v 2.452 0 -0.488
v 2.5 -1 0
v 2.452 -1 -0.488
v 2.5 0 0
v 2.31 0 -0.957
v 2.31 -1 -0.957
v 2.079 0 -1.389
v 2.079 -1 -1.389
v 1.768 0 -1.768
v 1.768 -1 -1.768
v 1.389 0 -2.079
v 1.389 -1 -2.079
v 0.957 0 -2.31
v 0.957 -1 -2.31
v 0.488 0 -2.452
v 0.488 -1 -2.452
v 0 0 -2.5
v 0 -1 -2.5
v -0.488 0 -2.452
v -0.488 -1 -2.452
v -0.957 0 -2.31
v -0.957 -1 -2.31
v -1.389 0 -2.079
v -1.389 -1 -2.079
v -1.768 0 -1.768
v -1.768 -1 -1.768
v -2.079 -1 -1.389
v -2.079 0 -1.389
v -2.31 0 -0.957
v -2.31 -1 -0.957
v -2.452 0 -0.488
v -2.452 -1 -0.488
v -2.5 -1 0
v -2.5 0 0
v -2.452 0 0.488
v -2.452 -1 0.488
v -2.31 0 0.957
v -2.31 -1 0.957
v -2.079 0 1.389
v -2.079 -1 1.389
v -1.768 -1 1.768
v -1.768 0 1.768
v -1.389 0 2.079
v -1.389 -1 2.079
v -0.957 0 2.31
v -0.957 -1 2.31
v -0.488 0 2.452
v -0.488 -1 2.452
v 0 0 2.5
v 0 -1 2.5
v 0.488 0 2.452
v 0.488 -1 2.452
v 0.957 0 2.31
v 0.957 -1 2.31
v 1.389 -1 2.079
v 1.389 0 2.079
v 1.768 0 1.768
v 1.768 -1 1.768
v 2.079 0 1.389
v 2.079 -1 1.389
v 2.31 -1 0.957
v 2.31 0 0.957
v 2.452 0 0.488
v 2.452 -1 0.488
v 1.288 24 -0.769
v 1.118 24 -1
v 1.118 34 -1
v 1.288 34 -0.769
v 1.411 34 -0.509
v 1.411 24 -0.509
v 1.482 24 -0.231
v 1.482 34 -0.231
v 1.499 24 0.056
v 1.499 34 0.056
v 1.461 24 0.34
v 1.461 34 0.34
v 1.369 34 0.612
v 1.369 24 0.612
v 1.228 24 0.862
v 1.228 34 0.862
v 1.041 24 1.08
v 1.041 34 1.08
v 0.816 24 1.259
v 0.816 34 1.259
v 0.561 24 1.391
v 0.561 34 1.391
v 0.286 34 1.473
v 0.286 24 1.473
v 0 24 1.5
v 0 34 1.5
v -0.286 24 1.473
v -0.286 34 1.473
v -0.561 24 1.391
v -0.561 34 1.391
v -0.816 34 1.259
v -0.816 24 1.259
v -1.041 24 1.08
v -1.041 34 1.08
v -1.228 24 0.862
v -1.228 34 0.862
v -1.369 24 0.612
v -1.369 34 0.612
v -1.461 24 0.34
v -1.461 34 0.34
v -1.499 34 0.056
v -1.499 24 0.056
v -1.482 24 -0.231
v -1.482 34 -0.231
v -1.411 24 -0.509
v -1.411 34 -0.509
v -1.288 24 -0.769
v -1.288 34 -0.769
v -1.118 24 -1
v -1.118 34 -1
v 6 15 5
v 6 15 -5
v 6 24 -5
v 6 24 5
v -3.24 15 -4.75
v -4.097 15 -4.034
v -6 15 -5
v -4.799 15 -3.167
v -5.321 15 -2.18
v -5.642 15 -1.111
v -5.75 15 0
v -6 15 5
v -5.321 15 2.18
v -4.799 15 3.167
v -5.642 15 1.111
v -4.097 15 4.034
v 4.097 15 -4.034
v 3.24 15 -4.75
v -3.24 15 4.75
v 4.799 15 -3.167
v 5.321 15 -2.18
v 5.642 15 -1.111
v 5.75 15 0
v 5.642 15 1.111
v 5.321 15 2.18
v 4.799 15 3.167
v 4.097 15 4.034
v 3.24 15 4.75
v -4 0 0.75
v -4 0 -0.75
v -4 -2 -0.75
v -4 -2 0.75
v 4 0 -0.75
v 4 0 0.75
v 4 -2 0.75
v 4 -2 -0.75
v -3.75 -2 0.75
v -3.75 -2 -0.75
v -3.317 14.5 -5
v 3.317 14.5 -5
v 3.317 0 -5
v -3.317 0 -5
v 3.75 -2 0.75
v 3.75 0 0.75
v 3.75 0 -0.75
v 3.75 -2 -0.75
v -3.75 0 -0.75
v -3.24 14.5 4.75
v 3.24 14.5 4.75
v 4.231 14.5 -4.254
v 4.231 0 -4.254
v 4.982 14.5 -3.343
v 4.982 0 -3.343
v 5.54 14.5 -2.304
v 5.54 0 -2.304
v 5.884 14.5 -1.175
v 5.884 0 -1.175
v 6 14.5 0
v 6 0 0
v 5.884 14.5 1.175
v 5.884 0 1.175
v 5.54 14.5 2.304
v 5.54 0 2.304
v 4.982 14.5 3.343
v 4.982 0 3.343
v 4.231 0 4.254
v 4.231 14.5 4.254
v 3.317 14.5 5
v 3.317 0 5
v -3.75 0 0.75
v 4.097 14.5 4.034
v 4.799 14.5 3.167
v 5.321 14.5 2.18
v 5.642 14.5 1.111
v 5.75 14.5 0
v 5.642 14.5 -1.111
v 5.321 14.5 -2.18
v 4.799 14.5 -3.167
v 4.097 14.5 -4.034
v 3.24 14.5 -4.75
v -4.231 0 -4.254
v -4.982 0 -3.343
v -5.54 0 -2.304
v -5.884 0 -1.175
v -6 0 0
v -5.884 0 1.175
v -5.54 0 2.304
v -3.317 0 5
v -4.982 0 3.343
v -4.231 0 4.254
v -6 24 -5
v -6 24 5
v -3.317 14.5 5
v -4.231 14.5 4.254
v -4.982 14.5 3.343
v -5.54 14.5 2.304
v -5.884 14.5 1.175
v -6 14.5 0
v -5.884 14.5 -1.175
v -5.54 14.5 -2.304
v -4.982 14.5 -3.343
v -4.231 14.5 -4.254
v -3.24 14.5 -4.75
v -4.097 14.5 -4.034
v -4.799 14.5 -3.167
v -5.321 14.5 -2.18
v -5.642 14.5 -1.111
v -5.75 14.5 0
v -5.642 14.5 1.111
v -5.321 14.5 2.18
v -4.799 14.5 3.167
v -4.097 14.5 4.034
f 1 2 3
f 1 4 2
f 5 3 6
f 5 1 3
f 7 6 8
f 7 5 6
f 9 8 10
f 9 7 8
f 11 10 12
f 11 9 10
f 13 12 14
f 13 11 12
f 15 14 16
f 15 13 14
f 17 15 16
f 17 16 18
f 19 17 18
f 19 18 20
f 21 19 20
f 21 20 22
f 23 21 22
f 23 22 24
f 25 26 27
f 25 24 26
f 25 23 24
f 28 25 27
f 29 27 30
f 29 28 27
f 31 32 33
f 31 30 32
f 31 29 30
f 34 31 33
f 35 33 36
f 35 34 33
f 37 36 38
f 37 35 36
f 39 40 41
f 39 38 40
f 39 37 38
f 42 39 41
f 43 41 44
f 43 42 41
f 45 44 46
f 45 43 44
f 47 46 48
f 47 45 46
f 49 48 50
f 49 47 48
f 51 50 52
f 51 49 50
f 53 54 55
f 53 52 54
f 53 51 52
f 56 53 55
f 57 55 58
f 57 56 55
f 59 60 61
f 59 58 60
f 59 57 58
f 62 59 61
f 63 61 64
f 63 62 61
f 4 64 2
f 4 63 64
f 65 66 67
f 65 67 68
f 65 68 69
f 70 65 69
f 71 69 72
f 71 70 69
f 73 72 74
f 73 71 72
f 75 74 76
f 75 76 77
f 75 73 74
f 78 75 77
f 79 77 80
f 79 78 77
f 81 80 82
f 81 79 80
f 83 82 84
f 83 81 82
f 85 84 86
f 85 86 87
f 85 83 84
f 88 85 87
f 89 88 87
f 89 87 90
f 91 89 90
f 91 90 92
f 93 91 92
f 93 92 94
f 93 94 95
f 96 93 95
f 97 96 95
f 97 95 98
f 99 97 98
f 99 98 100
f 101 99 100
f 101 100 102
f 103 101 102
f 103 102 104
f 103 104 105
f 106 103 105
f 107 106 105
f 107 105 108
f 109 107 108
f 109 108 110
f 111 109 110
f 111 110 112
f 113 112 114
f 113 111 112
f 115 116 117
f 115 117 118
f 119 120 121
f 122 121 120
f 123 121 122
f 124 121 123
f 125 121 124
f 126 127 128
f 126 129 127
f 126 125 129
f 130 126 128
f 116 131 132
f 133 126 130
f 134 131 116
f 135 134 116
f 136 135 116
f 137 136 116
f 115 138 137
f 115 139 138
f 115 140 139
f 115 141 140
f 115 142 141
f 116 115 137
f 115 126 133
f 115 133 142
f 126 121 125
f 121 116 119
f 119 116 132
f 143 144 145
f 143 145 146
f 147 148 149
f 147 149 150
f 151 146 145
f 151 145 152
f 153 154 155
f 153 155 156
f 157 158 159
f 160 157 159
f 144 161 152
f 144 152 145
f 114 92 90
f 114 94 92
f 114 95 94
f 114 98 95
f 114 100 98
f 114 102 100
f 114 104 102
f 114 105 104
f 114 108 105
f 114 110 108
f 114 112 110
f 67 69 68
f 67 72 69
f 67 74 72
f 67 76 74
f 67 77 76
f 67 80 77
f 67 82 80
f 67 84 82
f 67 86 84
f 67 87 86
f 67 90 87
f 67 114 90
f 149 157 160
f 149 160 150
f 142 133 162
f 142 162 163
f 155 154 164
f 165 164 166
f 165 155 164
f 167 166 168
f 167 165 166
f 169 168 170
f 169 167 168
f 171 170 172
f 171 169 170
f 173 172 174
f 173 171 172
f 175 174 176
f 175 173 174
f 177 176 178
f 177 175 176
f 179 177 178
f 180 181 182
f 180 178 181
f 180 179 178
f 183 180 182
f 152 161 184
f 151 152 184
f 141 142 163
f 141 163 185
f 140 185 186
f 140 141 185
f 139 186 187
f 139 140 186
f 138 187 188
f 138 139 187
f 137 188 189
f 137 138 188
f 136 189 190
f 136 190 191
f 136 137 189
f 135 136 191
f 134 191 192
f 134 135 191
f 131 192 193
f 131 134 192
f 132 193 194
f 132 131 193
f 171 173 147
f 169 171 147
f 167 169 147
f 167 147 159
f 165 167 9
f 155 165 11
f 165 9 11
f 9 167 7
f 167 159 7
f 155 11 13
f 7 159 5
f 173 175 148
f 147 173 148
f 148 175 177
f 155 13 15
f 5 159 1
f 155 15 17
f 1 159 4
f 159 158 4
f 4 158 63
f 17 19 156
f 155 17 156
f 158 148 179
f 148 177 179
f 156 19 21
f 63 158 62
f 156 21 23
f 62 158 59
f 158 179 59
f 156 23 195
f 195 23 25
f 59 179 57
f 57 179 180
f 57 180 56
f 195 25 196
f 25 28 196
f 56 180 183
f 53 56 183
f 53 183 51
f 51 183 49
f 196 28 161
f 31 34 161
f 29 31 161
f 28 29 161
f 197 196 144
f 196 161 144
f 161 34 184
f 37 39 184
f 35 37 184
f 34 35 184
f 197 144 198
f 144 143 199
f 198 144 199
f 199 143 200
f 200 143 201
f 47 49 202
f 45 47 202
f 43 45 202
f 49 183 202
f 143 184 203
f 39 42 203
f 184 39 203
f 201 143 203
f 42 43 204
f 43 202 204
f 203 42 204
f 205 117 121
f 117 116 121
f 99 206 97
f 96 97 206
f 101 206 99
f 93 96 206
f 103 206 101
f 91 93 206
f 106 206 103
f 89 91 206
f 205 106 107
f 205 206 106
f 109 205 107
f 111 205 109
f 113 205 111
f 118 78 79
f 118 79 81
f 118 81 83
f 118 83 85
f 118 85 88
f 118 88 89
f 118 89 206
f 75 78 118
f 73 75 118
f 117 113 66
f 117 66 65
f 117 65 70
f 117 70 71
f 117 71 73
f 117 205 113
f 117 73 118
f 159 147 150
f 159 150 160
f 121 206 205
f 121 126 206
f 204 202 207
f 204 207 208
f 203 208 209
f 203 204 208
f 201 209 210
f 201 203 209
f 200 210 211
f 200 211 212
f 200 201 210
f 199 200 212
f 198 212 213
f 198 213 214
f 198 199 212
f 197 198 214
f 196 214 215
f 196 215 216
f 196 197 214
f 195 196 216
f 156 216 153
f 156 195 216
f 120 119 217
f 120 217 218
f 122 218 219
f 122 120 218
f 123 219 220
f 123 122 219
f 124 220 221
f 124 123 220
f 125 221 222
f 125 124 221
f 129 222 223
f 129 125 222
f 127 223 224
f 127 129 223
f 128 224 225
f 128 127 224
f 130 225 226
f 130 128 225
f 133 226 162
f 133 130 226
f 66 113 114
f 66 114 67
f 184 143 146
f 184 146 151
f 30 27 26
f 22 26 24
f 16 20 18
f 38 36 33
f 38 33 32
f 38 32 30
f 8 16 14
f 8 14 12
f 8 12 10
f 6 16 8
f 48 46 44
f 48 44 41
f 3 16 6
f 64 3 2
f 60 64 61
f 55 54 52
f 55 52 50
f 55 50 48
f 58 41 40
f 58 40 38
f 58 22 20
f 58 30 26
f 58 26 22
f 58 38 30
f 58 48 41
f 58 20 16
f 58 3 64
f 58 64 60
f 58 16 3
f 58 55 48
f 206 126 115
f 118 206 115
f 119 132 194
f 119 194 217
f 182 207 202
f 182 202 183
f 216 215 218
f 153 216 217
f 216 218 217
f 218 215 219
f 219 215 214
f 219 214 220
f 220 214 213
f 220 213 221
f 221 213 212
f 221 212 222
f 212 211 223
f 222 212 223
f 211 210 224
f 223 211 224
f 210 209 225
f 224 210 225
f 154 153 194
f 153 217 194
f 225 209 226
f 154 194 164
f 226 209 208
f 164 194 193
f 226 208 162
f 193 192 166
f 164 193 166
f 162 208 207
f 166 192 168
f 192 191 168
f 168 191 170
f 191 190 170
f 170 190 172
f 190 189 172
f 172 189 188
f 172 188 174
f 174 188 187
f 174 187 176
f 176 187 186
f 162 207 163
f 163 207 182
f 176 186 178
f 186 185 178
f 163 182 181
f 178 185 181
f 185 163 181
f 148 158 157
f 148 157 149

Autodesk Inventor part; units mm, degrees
ref_plane "YZ Plane" through (0, 0, 0) normal (1, 0, 0) x (0, 1, 0)
ref_plane "XZ Plane" through (0, 0, 0) normal (0, 1, 0) x (-1, 0, 0)
ref_plane "XY Plane" through (0, 0, 0) normal (0, 0, 1) x (1, 0, 0)
sketch "スケッチ1" plane through (0, 0, 0) normal (0, 1, 0) x (-1, 0, 0)
  circle A0 centre (0, 0) radius 6
  line L0 (3.3166, 5) -> (-3.3166, 5)
  line L1 (-3.3166, 5) -> (-3.3166, -5)
  line L2 (-3.3166, -5) -> (3.3166, -5)
  line L3 (3.3166, -5) -> (3.3166, 5)
  dimension "d0" = 12
  dimension "d1" = 10
extrude "押し出し1" add sketch "スケッチ1" along normal blind 15 contours A0 L3 | L3 L2 L1 L0 | L1 A0
sketch "スケッチ2" plane through (0, 0, 0) normal (0, -1, 0) x (1, 0, 0)
  circle A0 centre (0, 0) radius 2.5
  dimension "d4" = 5
extrude "押し出し2" add sketch "スケッチ2" along normal blind 1
sketch "スケッチ3" plane through (0, 0, 0) normal (0, -1, 0) x (1, 0, 0)
  line L0 (4, -0.75) -> (-4, -0.75)
  line L1 (-4, -0.75) -> (-4, 0.75)
  line L2 (-4, 0.75) -> (4, 0.75)
  line L3 (4, 0.75) -> (4, -0.75)
  line L4 (3.75, -0.75) -> (-3.75, -0.75)
  line L5 (-3.75, -0.75) -> (-3.75, 0.75)
  line L6 (-3.75, 0.75) -> (3.75, 0.75)
  line L7 (3.75, 0.75) -> (3.75, -0.75)
  point P0 (0, 0)
  point P1 (4, 0)
  point P2 (0, -0.75)
  point P3 (0, 0.75)
  dimension "d7" = 8
  dimension "d8" = 1.5
  dimension "d9" = 7.5
extrude "押し出し3" add sketch "スケッチ3" along normal blind 2 contours L0 L7 L2 L3 | L0 L1 L2 L5
sketch "スケッチ4" plane through (0, 15, 0) normal (0, 1, 0) x (1, 0, 0)
  line L0 (-6, 5) -> (6, 5)
  line L1 (6, 5) -> (6, -5)
  line L2 (6, -5) -> (-6, -5)
  line L3 (-6, -5) -> (-6, 5)
  line L4 (3.3166, 5) -> (-3.3166, 5) projected
  arc A0 (3.3166, -5) -> (3.3166, 5) centre (0, 0) ccw projected
  arc A1 (-3.3166, 5) -> (-3.3166, -5) centre (0, 0) ccw projected
  line L5 (-3.3166, -5) -> (3.3166, -5) projected
extrude "押し出し4" add sketch "スケッチ4" along normal blind 9
sketch "スケッチ5" plane through (0, 24, 0) normal (0, 1, 0) x (1, 0, 0)
  circle A0 centre (0, 0) radius 1.5
  line L0 (-1.118, 1) -> (1.118, 1)
  dimension "d14" = 3
  dimension "d27" = 1
extrude "押し出し5" add sketch "スケッチ5" along normal blind 10 contours A0 L0 picked at (0.0594, 0.1702)
sketch "スケッチ6" plane through (0, 15, 0) normal (0, -1, 0) x (1, 0, 0)
  arc A0 (6, 0) -> (3.3166, 5) centre (0, 0) ccw projected
  line L0 (6, 5) -> (6, 0) projected
  line L1 (3.3166, 5) -> (6, 5) projected
  arc A1 (3.3166, -5) -> (6, 0) centre (0, 0) ccw projected
  line L2 (6, -5) -> (3.3166, -5) projected
  line L3 (6, 0) -> (6, -5) projected
  arc A2 (-6, 0) -> (-3.3166, -5) centre (0, 0) ccw projected
  line L4 (-6, -5) -> (-6, 0) projected
  line L5 (-3.3166, -5) -> (-6, -5) projected
  arc A3 (-3.3166, 5) -> (-6, 0) centre (0, 0) ccw projected
  line L6 (-6, 5) -> (-3.3166, 5) projected
  line L7 (-6, 0) -> (-6, 5) projected
  arc A4 (1.118, -1) -> (-1.118, -1) centre (0, 0) ccw projected
  line L8 (-6, -5) -> (-6, 5) projected
  line L9 (-6, 5) -> (6, 5) projected
  line L10 (6, 5) -> (6, -5) projected
  line L11 (6, -5) -> (-6, -5) projected
  circle A5 centre (0, 0) radius 5.75
  line L12 (3.2404, -4.75) -> (-3.2404, -4.75)
  line L13 (-3.2404, -4.75) -> (-3.2404, 4.75)
  line L14 (-3.2404, 4.75) -> (3.2404, 4.75)
  line L15 (3.2404, 4.75) -> (3.2404, -4.75)
  line L16 (-1.118, -1) -> (1.118, -1) projected
  point P0 (-3.3166, -5)
  point P1 (3.3166, -5)
  dimension "d17" = 11.5
  dimension "d18" = 9.5
extrude "押し出し6" cut sketch "スケッチ6" along normal blind 0.5 contours A1 L11 A5 L9 A0 | A0 L1 L0 | L3 L2 A1 | A5 L14 L9 | L11 A5 L12 | A5 L11 A2 A3 L9 | A3 L7 L6 | L5 L4 A2
properties part number "motor_6V_60RPM" material "アルミニウム 6061"
